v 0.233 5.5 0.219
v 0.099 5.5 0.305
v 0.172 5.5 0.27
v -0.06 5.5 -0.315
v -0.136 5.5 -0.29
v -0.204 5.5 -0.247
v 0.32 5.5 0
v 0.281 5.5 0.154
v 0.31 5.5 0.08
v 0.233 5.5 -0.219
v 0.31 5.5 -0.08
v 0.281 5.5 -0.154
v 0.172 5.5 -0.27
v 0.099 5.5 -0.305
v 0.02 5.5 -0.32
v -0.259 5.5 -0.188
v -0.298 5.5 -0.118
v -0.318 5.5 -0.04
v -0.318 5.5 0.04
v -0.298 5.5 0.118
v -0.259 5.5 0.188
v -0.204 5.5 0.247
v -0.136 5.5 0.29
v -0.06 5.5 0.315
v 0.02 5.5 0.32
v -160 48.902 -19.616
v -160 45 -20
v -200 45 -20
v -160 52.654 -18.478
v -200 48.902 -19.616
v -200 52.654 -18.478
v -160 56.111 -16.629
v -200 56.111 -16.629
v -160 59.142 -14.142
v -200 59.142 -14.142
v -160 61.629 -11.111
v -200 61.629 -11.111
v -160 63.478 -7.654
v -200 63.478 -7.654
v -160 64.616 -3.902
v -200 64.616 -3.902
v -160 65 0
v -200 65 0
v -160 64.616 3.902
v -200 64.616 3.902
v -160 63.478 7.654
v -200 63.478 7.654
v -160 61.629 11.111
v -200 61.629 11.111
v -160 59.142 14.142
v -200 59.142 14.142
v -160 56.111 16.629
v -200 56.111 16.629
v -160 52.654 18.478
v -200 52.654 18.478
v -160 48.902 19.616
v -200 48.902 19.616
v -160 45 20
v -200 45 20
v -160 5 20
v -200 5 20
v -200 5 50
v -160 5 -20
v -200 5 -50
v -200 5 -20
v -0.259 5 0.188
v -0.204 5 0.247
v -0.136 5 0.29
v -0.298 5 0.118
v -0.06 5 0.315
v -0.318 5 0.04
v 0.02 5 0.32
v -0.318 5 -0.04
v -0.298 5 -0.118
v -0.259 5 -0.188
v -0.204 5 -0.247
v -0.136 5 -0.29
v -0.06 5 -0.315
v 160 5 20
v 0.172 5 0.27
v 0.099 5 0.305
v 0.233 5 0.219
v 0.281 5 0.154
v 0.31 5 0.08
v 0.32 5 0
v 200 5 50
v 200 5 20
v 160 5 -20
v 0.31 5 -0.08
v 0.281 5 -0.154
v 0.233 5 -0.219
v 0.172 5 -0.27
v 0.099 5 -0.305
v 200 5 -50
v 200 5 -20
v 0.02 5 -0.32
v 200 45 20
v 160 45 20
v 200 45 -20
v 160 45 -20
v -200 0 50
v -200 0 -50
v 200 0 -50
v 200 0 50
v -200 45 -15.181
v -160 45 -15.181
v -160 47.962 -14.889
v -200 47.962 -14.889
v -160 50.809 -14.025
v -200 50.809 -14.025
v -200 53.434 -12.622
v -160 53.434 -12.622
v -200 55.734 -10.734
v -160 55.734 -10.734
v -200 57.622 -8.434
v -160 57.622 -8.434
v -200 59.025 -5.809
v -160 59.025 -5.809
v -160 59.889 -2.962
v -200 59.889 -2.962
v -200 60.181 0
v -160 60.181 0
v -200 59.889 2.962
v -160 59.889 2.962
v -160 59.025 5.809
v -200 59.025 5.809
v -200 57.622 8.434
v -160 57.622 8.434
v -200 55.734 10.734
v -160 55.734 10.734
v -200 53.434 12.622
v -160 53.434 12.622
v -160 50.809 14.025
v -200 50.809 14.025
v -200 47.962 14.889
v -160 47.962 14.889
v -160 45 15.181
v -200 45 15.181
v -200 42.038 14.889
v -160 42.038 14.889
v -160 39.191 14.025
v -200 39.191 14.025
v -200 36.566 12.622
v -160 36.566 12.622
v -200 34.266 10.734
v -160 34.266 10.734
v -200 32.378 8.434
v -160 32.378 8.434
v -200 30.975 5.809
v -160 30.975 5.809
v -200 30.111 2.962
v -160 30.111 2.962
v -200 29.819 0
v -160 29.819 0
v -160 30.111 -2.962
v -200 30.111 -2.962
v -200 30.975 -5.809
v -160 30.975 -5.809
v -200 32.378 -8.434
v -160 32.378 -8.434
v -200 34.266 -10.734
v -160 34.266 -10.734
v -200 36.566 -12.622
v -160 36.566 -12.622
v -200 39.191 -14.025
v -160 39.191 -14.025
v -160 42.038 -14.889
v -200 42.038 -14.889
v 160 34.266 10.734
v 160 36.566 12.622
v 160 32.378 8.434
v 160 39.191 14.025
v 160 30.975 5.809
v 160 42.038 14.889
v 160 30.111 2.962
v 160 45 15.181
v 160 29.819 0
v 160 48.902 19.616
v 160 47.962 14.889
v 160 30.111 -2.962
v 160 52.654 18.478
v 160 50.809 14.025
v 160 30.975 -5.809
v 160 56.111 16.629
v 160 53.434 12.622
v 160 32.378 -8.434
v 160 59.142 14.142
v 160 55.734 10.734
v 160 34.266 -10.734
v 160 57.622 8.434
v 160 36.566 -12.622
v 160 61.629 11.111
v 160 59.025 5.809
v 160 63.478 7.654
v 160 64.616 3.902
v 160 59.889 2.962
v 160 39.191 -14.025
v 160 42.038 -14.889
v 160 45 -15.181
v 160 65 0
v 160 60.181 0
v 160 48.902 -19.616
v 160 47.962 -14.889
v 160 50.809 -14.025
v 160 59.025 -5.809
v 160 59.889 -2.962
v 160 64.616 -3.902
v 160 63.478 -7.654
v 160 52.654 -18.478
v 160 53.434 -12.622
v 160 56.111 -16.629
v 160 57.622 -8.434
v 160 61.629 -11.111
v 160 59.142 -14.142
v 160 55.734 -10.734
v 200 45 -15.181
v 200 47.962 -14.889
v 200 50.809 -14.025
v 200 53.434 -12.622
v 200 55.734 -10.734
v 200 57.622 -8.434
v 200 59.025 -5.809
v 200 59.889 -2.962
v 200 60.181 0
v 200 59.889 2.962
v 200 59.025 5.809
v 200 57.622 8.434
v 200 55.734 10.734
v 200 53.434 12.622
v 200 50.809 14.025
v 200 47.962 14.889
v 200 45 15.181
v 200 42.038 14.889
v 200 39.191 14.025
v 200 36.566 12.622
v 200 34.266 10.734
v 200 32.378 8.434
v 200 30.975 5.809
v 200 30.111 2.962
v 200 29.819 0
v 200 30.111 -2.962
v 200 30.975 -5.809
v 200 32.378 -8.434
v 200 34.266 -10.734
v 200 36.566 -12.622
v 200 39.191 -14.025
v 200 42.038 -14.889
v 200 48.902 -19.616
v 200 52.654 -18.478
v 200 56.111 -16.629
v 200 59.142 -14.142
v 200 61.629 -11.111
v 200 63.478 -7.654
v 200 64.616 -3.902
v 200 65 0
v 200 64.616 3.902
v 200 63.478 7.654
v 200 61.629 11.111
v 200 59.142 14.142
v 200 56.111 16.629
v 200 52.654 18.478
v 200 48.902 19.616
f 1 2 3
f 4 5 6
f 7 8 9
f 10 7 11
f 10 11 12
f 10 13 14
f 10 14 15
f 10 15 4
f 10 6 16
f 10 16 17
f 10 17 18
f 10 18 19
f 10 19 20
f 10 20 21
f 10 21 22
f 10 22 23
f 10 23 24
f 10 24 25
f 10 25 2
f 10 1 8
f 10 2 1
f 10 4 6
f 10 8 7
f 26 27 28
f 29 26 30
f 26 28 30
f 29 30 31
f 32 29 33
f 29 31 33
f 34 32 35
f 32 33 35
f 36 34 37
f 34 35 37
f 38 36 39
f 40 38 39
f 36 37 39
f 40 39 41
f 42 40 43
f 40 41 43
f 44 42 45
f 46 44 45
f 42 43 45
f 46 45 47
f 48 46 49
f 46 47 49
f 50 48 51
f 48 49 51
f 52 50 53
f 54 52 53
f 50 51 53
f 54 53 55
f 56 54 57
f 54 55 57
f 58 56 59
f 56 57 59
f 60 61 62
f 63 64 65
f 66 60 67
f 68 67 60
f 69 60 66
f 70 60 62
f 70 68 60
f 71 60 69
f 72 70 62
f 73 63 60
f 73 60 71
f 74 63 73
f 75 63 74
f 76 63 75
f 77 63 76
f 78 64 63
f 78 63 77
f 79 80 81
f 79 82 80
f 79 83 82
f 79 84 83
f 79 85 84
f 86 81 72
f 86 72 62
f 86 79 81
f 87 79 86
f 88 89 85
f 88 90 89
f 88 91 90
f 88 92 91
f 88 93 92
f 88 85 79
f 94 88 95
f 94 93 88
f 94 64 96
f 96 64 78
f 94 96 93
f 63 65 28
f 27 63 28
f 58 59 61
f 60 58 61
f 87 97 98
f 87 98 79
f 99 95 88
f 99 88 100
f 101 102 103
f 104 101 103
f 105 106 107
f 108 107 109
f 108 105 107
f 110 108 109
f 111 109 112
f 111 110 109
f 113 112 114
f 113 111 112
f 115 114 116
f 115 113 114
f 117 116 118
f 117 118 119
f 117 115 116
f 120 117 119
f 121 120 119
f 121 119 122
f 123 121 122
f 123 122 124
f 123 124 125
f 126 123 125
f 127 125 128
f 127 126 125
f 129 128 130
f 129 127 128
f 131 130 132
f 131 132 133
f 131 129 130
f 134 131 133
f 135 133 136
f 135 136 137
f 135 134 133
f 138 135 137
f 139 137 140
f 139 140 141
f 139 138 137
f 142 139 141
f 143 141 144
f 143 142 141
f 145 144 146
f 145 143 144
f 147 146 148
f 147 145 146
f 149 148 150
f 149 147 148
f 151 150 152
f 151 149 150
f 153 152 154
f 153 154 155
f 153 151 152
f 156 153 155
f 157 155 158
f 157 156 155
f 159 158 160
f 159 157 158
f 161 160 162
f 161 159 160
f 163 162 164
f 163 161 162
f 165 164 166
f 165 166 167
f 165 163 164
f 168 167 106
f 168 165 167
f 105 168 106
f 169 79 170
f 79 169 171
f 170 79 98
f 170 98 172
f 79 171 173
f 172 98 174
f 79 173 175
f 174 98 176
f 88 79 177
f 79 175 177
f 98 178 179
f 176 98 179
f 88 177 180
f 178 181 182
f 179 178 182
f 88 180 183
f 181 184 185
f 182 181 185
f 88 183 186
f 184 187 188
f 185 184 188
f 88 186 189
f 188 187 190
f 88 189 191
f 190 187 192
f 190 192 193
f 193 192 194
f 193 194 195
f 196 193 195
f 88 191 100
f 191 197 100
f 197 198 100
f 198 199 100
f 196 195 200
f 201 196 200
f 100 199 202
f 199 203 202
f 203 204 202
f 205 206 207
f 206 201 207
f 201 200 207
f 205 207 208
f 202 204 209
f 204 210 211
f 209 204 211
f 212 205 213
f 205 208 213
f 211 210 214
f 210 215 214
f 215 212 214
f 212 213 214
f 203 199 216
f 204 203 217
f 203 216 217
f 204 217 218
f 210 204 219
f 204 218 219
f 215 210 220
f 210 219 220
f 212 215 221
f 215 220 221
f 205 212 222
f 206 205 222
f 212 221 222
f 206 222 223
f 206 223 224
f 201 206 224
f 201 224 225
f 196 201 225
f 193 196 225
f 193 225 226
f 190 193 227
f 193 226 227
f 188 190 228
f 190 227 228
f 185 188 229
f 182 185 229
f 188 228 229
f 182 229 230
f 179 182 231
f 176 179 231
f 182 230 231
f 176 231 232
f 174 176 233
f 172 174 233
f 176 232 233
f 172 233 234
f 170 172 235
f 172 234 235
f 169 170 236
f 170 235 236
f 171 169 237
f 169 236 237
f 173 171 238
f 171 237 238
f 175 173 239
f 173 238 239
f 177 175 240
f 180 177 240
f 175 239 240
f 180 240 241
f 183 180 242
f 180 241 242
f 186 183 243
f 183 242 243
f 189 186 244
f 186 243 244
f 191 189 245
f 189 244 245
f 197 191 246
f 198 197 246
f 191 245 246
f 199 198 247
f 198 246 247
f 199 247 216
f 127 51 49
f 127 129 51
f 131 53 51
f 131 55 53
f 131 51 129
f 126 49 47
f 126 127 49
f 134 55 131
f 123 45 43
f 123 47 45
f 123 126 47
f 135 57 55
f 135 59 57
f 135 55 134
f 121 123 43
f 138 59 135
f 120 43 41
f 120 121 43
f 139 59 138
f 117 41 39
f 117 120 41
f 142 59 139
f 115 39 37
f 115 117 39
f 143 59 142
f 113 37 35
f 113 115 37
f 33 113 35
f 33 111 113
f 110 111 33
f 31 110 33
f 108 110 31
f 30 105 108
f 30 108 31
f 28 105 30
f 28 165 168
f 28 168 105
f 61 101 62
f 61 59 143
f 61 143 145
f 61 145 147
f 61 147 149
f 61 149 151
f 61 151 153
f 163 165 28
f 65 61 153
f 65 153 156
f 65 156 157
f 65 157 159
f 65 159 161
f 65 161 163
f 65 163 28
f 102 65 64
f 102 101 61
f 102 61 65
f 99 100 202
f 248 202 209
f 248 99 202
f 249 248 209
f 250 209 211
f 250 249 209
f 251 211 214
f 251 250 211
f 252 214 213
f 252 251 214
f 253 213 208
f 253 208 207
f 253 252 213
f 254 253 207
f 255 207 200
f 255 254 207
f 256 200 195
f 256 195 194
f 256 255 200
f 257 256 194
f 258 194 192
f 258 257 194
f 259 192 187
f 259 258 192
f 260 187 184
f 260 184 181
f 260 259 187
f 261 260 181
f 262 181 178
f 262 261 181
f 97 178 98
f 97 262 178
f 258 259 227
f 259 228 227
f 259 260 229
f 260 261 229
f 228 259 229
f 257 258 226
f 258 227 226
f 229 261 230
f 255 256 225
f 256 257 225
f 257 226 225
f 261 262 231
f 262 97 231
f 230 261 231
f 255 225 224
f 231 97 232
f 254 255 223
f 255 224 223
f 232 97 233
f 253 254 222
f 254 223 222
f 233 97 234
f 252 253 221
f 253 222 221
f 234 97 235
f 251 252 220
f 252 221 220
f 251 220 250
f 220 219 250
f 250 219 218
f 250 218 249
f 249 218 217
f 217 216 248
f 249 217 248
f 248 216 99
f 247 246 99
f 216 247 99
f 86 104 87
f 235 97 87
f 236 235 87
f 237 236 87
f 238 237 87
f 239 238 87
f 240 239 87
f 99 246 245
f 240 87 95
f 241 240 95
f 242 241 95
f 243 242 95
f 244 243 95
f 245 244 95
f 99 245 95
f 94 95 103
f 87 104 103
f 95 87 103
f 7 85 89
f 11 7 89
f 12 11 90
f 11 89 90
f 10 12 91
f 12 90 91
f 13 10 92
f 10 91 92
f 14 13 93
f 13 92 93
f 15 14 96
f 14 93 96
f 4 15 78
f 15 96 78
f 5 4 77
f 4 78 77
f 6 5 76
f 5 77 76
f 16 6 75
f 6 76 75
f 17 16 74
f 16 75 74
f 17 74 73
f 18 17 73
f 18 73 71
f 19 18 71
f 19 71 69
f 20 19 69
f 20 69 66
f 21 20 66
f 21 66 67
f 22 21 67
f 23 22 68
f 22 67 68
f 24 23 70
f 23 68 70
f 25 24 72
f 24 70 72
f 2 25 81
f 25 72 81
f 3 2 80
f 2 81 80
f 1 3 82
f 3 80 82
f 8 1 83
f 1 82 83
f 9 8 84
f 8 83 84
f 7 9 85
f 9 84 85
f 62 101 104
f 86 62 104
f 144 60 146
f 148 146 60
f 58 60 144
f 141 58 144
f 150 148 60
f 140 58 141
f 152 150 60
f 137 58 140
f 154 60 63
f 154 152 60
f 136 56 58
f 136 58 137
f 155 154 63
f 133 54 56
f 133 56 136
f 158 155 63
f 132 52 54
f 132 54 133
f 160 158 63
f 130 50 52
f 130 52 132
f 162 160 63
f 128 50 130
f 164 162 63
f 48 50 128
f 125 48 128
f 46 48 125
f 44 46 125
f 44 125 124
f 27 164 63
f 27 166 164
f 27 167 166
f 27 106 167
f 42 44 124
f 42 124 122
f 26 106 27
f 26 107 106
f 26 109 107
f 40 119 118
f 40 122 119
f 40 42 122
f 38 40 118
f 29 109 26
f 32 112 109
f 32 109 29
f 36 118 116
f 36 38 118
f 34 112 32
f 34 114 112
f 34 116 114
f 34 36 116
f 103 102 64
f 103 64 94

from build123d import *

# Parameters (mm, degrees)
SKETCH1_W           = 400
SKETCH1_H           = 100
BOSS_EXTRUDE1_DEPTH = 5
SKETCH6_R           = 15.180517927
BOSS_EXTRUDE2_DEPTH = 40
SKETCH7_R           = 0.320199733
BOSS_EXTRUDE3_DEPTH = 0.5


with BuildPart() as part:
    # Sketch1 → Boss-Extrude1 (new body)
    with BuildSketch(Plane(origin=(0, 0, 0), x_dir=(1, 0, 0), z_dir=(0, 1, 0))):
        Rectangle(SKETCH1_W, SKETCH1_H)
    extrude(amount=BOSS_EXTRUDE1_DEPTH)

    # Sketch6 → Boss-Extrude2 (add)
    with BuildSketch(Plane(origin=(200, 0, 0), x_dir=(0, 0, -1), z_dir=(1, 0, 0))):
        with BuildLine():
            Line((-20, 45), (-20, 5))
            Line((-20, 5), (20, 5))
            Line((20, 5), (20, 45))
            ThreePointArc((20, 45), (0, 65), (-20, 45))
        make_face()
        with Locations((0, 45)):
            Circle(SKETCH6_R, mode=Mode.SUBTRACT)
    boss_extrude2 = extrude(amount=-BOSS_EXTRUDE2_DEPTH)

    # Mirror1: Boss-Extrude2 across plane
    add(boss_extrude2.mirror(Plane(origin=(0, 0, 0), x_dir=(0, 0, 1), z_dir=(1, 0, 0))))

    # Sketch7 → Boss-Extrude3 (add)
    with BuildSketch(Plane(origin=(0, 5, 0), x_dir=(1, 0, 0), z_dir=(0, 1, 0))):
        Circle(SKETCH7_R)
    extrude(amount=BOSS_EXTRUDE3_DEPTH)


solid = part.part
